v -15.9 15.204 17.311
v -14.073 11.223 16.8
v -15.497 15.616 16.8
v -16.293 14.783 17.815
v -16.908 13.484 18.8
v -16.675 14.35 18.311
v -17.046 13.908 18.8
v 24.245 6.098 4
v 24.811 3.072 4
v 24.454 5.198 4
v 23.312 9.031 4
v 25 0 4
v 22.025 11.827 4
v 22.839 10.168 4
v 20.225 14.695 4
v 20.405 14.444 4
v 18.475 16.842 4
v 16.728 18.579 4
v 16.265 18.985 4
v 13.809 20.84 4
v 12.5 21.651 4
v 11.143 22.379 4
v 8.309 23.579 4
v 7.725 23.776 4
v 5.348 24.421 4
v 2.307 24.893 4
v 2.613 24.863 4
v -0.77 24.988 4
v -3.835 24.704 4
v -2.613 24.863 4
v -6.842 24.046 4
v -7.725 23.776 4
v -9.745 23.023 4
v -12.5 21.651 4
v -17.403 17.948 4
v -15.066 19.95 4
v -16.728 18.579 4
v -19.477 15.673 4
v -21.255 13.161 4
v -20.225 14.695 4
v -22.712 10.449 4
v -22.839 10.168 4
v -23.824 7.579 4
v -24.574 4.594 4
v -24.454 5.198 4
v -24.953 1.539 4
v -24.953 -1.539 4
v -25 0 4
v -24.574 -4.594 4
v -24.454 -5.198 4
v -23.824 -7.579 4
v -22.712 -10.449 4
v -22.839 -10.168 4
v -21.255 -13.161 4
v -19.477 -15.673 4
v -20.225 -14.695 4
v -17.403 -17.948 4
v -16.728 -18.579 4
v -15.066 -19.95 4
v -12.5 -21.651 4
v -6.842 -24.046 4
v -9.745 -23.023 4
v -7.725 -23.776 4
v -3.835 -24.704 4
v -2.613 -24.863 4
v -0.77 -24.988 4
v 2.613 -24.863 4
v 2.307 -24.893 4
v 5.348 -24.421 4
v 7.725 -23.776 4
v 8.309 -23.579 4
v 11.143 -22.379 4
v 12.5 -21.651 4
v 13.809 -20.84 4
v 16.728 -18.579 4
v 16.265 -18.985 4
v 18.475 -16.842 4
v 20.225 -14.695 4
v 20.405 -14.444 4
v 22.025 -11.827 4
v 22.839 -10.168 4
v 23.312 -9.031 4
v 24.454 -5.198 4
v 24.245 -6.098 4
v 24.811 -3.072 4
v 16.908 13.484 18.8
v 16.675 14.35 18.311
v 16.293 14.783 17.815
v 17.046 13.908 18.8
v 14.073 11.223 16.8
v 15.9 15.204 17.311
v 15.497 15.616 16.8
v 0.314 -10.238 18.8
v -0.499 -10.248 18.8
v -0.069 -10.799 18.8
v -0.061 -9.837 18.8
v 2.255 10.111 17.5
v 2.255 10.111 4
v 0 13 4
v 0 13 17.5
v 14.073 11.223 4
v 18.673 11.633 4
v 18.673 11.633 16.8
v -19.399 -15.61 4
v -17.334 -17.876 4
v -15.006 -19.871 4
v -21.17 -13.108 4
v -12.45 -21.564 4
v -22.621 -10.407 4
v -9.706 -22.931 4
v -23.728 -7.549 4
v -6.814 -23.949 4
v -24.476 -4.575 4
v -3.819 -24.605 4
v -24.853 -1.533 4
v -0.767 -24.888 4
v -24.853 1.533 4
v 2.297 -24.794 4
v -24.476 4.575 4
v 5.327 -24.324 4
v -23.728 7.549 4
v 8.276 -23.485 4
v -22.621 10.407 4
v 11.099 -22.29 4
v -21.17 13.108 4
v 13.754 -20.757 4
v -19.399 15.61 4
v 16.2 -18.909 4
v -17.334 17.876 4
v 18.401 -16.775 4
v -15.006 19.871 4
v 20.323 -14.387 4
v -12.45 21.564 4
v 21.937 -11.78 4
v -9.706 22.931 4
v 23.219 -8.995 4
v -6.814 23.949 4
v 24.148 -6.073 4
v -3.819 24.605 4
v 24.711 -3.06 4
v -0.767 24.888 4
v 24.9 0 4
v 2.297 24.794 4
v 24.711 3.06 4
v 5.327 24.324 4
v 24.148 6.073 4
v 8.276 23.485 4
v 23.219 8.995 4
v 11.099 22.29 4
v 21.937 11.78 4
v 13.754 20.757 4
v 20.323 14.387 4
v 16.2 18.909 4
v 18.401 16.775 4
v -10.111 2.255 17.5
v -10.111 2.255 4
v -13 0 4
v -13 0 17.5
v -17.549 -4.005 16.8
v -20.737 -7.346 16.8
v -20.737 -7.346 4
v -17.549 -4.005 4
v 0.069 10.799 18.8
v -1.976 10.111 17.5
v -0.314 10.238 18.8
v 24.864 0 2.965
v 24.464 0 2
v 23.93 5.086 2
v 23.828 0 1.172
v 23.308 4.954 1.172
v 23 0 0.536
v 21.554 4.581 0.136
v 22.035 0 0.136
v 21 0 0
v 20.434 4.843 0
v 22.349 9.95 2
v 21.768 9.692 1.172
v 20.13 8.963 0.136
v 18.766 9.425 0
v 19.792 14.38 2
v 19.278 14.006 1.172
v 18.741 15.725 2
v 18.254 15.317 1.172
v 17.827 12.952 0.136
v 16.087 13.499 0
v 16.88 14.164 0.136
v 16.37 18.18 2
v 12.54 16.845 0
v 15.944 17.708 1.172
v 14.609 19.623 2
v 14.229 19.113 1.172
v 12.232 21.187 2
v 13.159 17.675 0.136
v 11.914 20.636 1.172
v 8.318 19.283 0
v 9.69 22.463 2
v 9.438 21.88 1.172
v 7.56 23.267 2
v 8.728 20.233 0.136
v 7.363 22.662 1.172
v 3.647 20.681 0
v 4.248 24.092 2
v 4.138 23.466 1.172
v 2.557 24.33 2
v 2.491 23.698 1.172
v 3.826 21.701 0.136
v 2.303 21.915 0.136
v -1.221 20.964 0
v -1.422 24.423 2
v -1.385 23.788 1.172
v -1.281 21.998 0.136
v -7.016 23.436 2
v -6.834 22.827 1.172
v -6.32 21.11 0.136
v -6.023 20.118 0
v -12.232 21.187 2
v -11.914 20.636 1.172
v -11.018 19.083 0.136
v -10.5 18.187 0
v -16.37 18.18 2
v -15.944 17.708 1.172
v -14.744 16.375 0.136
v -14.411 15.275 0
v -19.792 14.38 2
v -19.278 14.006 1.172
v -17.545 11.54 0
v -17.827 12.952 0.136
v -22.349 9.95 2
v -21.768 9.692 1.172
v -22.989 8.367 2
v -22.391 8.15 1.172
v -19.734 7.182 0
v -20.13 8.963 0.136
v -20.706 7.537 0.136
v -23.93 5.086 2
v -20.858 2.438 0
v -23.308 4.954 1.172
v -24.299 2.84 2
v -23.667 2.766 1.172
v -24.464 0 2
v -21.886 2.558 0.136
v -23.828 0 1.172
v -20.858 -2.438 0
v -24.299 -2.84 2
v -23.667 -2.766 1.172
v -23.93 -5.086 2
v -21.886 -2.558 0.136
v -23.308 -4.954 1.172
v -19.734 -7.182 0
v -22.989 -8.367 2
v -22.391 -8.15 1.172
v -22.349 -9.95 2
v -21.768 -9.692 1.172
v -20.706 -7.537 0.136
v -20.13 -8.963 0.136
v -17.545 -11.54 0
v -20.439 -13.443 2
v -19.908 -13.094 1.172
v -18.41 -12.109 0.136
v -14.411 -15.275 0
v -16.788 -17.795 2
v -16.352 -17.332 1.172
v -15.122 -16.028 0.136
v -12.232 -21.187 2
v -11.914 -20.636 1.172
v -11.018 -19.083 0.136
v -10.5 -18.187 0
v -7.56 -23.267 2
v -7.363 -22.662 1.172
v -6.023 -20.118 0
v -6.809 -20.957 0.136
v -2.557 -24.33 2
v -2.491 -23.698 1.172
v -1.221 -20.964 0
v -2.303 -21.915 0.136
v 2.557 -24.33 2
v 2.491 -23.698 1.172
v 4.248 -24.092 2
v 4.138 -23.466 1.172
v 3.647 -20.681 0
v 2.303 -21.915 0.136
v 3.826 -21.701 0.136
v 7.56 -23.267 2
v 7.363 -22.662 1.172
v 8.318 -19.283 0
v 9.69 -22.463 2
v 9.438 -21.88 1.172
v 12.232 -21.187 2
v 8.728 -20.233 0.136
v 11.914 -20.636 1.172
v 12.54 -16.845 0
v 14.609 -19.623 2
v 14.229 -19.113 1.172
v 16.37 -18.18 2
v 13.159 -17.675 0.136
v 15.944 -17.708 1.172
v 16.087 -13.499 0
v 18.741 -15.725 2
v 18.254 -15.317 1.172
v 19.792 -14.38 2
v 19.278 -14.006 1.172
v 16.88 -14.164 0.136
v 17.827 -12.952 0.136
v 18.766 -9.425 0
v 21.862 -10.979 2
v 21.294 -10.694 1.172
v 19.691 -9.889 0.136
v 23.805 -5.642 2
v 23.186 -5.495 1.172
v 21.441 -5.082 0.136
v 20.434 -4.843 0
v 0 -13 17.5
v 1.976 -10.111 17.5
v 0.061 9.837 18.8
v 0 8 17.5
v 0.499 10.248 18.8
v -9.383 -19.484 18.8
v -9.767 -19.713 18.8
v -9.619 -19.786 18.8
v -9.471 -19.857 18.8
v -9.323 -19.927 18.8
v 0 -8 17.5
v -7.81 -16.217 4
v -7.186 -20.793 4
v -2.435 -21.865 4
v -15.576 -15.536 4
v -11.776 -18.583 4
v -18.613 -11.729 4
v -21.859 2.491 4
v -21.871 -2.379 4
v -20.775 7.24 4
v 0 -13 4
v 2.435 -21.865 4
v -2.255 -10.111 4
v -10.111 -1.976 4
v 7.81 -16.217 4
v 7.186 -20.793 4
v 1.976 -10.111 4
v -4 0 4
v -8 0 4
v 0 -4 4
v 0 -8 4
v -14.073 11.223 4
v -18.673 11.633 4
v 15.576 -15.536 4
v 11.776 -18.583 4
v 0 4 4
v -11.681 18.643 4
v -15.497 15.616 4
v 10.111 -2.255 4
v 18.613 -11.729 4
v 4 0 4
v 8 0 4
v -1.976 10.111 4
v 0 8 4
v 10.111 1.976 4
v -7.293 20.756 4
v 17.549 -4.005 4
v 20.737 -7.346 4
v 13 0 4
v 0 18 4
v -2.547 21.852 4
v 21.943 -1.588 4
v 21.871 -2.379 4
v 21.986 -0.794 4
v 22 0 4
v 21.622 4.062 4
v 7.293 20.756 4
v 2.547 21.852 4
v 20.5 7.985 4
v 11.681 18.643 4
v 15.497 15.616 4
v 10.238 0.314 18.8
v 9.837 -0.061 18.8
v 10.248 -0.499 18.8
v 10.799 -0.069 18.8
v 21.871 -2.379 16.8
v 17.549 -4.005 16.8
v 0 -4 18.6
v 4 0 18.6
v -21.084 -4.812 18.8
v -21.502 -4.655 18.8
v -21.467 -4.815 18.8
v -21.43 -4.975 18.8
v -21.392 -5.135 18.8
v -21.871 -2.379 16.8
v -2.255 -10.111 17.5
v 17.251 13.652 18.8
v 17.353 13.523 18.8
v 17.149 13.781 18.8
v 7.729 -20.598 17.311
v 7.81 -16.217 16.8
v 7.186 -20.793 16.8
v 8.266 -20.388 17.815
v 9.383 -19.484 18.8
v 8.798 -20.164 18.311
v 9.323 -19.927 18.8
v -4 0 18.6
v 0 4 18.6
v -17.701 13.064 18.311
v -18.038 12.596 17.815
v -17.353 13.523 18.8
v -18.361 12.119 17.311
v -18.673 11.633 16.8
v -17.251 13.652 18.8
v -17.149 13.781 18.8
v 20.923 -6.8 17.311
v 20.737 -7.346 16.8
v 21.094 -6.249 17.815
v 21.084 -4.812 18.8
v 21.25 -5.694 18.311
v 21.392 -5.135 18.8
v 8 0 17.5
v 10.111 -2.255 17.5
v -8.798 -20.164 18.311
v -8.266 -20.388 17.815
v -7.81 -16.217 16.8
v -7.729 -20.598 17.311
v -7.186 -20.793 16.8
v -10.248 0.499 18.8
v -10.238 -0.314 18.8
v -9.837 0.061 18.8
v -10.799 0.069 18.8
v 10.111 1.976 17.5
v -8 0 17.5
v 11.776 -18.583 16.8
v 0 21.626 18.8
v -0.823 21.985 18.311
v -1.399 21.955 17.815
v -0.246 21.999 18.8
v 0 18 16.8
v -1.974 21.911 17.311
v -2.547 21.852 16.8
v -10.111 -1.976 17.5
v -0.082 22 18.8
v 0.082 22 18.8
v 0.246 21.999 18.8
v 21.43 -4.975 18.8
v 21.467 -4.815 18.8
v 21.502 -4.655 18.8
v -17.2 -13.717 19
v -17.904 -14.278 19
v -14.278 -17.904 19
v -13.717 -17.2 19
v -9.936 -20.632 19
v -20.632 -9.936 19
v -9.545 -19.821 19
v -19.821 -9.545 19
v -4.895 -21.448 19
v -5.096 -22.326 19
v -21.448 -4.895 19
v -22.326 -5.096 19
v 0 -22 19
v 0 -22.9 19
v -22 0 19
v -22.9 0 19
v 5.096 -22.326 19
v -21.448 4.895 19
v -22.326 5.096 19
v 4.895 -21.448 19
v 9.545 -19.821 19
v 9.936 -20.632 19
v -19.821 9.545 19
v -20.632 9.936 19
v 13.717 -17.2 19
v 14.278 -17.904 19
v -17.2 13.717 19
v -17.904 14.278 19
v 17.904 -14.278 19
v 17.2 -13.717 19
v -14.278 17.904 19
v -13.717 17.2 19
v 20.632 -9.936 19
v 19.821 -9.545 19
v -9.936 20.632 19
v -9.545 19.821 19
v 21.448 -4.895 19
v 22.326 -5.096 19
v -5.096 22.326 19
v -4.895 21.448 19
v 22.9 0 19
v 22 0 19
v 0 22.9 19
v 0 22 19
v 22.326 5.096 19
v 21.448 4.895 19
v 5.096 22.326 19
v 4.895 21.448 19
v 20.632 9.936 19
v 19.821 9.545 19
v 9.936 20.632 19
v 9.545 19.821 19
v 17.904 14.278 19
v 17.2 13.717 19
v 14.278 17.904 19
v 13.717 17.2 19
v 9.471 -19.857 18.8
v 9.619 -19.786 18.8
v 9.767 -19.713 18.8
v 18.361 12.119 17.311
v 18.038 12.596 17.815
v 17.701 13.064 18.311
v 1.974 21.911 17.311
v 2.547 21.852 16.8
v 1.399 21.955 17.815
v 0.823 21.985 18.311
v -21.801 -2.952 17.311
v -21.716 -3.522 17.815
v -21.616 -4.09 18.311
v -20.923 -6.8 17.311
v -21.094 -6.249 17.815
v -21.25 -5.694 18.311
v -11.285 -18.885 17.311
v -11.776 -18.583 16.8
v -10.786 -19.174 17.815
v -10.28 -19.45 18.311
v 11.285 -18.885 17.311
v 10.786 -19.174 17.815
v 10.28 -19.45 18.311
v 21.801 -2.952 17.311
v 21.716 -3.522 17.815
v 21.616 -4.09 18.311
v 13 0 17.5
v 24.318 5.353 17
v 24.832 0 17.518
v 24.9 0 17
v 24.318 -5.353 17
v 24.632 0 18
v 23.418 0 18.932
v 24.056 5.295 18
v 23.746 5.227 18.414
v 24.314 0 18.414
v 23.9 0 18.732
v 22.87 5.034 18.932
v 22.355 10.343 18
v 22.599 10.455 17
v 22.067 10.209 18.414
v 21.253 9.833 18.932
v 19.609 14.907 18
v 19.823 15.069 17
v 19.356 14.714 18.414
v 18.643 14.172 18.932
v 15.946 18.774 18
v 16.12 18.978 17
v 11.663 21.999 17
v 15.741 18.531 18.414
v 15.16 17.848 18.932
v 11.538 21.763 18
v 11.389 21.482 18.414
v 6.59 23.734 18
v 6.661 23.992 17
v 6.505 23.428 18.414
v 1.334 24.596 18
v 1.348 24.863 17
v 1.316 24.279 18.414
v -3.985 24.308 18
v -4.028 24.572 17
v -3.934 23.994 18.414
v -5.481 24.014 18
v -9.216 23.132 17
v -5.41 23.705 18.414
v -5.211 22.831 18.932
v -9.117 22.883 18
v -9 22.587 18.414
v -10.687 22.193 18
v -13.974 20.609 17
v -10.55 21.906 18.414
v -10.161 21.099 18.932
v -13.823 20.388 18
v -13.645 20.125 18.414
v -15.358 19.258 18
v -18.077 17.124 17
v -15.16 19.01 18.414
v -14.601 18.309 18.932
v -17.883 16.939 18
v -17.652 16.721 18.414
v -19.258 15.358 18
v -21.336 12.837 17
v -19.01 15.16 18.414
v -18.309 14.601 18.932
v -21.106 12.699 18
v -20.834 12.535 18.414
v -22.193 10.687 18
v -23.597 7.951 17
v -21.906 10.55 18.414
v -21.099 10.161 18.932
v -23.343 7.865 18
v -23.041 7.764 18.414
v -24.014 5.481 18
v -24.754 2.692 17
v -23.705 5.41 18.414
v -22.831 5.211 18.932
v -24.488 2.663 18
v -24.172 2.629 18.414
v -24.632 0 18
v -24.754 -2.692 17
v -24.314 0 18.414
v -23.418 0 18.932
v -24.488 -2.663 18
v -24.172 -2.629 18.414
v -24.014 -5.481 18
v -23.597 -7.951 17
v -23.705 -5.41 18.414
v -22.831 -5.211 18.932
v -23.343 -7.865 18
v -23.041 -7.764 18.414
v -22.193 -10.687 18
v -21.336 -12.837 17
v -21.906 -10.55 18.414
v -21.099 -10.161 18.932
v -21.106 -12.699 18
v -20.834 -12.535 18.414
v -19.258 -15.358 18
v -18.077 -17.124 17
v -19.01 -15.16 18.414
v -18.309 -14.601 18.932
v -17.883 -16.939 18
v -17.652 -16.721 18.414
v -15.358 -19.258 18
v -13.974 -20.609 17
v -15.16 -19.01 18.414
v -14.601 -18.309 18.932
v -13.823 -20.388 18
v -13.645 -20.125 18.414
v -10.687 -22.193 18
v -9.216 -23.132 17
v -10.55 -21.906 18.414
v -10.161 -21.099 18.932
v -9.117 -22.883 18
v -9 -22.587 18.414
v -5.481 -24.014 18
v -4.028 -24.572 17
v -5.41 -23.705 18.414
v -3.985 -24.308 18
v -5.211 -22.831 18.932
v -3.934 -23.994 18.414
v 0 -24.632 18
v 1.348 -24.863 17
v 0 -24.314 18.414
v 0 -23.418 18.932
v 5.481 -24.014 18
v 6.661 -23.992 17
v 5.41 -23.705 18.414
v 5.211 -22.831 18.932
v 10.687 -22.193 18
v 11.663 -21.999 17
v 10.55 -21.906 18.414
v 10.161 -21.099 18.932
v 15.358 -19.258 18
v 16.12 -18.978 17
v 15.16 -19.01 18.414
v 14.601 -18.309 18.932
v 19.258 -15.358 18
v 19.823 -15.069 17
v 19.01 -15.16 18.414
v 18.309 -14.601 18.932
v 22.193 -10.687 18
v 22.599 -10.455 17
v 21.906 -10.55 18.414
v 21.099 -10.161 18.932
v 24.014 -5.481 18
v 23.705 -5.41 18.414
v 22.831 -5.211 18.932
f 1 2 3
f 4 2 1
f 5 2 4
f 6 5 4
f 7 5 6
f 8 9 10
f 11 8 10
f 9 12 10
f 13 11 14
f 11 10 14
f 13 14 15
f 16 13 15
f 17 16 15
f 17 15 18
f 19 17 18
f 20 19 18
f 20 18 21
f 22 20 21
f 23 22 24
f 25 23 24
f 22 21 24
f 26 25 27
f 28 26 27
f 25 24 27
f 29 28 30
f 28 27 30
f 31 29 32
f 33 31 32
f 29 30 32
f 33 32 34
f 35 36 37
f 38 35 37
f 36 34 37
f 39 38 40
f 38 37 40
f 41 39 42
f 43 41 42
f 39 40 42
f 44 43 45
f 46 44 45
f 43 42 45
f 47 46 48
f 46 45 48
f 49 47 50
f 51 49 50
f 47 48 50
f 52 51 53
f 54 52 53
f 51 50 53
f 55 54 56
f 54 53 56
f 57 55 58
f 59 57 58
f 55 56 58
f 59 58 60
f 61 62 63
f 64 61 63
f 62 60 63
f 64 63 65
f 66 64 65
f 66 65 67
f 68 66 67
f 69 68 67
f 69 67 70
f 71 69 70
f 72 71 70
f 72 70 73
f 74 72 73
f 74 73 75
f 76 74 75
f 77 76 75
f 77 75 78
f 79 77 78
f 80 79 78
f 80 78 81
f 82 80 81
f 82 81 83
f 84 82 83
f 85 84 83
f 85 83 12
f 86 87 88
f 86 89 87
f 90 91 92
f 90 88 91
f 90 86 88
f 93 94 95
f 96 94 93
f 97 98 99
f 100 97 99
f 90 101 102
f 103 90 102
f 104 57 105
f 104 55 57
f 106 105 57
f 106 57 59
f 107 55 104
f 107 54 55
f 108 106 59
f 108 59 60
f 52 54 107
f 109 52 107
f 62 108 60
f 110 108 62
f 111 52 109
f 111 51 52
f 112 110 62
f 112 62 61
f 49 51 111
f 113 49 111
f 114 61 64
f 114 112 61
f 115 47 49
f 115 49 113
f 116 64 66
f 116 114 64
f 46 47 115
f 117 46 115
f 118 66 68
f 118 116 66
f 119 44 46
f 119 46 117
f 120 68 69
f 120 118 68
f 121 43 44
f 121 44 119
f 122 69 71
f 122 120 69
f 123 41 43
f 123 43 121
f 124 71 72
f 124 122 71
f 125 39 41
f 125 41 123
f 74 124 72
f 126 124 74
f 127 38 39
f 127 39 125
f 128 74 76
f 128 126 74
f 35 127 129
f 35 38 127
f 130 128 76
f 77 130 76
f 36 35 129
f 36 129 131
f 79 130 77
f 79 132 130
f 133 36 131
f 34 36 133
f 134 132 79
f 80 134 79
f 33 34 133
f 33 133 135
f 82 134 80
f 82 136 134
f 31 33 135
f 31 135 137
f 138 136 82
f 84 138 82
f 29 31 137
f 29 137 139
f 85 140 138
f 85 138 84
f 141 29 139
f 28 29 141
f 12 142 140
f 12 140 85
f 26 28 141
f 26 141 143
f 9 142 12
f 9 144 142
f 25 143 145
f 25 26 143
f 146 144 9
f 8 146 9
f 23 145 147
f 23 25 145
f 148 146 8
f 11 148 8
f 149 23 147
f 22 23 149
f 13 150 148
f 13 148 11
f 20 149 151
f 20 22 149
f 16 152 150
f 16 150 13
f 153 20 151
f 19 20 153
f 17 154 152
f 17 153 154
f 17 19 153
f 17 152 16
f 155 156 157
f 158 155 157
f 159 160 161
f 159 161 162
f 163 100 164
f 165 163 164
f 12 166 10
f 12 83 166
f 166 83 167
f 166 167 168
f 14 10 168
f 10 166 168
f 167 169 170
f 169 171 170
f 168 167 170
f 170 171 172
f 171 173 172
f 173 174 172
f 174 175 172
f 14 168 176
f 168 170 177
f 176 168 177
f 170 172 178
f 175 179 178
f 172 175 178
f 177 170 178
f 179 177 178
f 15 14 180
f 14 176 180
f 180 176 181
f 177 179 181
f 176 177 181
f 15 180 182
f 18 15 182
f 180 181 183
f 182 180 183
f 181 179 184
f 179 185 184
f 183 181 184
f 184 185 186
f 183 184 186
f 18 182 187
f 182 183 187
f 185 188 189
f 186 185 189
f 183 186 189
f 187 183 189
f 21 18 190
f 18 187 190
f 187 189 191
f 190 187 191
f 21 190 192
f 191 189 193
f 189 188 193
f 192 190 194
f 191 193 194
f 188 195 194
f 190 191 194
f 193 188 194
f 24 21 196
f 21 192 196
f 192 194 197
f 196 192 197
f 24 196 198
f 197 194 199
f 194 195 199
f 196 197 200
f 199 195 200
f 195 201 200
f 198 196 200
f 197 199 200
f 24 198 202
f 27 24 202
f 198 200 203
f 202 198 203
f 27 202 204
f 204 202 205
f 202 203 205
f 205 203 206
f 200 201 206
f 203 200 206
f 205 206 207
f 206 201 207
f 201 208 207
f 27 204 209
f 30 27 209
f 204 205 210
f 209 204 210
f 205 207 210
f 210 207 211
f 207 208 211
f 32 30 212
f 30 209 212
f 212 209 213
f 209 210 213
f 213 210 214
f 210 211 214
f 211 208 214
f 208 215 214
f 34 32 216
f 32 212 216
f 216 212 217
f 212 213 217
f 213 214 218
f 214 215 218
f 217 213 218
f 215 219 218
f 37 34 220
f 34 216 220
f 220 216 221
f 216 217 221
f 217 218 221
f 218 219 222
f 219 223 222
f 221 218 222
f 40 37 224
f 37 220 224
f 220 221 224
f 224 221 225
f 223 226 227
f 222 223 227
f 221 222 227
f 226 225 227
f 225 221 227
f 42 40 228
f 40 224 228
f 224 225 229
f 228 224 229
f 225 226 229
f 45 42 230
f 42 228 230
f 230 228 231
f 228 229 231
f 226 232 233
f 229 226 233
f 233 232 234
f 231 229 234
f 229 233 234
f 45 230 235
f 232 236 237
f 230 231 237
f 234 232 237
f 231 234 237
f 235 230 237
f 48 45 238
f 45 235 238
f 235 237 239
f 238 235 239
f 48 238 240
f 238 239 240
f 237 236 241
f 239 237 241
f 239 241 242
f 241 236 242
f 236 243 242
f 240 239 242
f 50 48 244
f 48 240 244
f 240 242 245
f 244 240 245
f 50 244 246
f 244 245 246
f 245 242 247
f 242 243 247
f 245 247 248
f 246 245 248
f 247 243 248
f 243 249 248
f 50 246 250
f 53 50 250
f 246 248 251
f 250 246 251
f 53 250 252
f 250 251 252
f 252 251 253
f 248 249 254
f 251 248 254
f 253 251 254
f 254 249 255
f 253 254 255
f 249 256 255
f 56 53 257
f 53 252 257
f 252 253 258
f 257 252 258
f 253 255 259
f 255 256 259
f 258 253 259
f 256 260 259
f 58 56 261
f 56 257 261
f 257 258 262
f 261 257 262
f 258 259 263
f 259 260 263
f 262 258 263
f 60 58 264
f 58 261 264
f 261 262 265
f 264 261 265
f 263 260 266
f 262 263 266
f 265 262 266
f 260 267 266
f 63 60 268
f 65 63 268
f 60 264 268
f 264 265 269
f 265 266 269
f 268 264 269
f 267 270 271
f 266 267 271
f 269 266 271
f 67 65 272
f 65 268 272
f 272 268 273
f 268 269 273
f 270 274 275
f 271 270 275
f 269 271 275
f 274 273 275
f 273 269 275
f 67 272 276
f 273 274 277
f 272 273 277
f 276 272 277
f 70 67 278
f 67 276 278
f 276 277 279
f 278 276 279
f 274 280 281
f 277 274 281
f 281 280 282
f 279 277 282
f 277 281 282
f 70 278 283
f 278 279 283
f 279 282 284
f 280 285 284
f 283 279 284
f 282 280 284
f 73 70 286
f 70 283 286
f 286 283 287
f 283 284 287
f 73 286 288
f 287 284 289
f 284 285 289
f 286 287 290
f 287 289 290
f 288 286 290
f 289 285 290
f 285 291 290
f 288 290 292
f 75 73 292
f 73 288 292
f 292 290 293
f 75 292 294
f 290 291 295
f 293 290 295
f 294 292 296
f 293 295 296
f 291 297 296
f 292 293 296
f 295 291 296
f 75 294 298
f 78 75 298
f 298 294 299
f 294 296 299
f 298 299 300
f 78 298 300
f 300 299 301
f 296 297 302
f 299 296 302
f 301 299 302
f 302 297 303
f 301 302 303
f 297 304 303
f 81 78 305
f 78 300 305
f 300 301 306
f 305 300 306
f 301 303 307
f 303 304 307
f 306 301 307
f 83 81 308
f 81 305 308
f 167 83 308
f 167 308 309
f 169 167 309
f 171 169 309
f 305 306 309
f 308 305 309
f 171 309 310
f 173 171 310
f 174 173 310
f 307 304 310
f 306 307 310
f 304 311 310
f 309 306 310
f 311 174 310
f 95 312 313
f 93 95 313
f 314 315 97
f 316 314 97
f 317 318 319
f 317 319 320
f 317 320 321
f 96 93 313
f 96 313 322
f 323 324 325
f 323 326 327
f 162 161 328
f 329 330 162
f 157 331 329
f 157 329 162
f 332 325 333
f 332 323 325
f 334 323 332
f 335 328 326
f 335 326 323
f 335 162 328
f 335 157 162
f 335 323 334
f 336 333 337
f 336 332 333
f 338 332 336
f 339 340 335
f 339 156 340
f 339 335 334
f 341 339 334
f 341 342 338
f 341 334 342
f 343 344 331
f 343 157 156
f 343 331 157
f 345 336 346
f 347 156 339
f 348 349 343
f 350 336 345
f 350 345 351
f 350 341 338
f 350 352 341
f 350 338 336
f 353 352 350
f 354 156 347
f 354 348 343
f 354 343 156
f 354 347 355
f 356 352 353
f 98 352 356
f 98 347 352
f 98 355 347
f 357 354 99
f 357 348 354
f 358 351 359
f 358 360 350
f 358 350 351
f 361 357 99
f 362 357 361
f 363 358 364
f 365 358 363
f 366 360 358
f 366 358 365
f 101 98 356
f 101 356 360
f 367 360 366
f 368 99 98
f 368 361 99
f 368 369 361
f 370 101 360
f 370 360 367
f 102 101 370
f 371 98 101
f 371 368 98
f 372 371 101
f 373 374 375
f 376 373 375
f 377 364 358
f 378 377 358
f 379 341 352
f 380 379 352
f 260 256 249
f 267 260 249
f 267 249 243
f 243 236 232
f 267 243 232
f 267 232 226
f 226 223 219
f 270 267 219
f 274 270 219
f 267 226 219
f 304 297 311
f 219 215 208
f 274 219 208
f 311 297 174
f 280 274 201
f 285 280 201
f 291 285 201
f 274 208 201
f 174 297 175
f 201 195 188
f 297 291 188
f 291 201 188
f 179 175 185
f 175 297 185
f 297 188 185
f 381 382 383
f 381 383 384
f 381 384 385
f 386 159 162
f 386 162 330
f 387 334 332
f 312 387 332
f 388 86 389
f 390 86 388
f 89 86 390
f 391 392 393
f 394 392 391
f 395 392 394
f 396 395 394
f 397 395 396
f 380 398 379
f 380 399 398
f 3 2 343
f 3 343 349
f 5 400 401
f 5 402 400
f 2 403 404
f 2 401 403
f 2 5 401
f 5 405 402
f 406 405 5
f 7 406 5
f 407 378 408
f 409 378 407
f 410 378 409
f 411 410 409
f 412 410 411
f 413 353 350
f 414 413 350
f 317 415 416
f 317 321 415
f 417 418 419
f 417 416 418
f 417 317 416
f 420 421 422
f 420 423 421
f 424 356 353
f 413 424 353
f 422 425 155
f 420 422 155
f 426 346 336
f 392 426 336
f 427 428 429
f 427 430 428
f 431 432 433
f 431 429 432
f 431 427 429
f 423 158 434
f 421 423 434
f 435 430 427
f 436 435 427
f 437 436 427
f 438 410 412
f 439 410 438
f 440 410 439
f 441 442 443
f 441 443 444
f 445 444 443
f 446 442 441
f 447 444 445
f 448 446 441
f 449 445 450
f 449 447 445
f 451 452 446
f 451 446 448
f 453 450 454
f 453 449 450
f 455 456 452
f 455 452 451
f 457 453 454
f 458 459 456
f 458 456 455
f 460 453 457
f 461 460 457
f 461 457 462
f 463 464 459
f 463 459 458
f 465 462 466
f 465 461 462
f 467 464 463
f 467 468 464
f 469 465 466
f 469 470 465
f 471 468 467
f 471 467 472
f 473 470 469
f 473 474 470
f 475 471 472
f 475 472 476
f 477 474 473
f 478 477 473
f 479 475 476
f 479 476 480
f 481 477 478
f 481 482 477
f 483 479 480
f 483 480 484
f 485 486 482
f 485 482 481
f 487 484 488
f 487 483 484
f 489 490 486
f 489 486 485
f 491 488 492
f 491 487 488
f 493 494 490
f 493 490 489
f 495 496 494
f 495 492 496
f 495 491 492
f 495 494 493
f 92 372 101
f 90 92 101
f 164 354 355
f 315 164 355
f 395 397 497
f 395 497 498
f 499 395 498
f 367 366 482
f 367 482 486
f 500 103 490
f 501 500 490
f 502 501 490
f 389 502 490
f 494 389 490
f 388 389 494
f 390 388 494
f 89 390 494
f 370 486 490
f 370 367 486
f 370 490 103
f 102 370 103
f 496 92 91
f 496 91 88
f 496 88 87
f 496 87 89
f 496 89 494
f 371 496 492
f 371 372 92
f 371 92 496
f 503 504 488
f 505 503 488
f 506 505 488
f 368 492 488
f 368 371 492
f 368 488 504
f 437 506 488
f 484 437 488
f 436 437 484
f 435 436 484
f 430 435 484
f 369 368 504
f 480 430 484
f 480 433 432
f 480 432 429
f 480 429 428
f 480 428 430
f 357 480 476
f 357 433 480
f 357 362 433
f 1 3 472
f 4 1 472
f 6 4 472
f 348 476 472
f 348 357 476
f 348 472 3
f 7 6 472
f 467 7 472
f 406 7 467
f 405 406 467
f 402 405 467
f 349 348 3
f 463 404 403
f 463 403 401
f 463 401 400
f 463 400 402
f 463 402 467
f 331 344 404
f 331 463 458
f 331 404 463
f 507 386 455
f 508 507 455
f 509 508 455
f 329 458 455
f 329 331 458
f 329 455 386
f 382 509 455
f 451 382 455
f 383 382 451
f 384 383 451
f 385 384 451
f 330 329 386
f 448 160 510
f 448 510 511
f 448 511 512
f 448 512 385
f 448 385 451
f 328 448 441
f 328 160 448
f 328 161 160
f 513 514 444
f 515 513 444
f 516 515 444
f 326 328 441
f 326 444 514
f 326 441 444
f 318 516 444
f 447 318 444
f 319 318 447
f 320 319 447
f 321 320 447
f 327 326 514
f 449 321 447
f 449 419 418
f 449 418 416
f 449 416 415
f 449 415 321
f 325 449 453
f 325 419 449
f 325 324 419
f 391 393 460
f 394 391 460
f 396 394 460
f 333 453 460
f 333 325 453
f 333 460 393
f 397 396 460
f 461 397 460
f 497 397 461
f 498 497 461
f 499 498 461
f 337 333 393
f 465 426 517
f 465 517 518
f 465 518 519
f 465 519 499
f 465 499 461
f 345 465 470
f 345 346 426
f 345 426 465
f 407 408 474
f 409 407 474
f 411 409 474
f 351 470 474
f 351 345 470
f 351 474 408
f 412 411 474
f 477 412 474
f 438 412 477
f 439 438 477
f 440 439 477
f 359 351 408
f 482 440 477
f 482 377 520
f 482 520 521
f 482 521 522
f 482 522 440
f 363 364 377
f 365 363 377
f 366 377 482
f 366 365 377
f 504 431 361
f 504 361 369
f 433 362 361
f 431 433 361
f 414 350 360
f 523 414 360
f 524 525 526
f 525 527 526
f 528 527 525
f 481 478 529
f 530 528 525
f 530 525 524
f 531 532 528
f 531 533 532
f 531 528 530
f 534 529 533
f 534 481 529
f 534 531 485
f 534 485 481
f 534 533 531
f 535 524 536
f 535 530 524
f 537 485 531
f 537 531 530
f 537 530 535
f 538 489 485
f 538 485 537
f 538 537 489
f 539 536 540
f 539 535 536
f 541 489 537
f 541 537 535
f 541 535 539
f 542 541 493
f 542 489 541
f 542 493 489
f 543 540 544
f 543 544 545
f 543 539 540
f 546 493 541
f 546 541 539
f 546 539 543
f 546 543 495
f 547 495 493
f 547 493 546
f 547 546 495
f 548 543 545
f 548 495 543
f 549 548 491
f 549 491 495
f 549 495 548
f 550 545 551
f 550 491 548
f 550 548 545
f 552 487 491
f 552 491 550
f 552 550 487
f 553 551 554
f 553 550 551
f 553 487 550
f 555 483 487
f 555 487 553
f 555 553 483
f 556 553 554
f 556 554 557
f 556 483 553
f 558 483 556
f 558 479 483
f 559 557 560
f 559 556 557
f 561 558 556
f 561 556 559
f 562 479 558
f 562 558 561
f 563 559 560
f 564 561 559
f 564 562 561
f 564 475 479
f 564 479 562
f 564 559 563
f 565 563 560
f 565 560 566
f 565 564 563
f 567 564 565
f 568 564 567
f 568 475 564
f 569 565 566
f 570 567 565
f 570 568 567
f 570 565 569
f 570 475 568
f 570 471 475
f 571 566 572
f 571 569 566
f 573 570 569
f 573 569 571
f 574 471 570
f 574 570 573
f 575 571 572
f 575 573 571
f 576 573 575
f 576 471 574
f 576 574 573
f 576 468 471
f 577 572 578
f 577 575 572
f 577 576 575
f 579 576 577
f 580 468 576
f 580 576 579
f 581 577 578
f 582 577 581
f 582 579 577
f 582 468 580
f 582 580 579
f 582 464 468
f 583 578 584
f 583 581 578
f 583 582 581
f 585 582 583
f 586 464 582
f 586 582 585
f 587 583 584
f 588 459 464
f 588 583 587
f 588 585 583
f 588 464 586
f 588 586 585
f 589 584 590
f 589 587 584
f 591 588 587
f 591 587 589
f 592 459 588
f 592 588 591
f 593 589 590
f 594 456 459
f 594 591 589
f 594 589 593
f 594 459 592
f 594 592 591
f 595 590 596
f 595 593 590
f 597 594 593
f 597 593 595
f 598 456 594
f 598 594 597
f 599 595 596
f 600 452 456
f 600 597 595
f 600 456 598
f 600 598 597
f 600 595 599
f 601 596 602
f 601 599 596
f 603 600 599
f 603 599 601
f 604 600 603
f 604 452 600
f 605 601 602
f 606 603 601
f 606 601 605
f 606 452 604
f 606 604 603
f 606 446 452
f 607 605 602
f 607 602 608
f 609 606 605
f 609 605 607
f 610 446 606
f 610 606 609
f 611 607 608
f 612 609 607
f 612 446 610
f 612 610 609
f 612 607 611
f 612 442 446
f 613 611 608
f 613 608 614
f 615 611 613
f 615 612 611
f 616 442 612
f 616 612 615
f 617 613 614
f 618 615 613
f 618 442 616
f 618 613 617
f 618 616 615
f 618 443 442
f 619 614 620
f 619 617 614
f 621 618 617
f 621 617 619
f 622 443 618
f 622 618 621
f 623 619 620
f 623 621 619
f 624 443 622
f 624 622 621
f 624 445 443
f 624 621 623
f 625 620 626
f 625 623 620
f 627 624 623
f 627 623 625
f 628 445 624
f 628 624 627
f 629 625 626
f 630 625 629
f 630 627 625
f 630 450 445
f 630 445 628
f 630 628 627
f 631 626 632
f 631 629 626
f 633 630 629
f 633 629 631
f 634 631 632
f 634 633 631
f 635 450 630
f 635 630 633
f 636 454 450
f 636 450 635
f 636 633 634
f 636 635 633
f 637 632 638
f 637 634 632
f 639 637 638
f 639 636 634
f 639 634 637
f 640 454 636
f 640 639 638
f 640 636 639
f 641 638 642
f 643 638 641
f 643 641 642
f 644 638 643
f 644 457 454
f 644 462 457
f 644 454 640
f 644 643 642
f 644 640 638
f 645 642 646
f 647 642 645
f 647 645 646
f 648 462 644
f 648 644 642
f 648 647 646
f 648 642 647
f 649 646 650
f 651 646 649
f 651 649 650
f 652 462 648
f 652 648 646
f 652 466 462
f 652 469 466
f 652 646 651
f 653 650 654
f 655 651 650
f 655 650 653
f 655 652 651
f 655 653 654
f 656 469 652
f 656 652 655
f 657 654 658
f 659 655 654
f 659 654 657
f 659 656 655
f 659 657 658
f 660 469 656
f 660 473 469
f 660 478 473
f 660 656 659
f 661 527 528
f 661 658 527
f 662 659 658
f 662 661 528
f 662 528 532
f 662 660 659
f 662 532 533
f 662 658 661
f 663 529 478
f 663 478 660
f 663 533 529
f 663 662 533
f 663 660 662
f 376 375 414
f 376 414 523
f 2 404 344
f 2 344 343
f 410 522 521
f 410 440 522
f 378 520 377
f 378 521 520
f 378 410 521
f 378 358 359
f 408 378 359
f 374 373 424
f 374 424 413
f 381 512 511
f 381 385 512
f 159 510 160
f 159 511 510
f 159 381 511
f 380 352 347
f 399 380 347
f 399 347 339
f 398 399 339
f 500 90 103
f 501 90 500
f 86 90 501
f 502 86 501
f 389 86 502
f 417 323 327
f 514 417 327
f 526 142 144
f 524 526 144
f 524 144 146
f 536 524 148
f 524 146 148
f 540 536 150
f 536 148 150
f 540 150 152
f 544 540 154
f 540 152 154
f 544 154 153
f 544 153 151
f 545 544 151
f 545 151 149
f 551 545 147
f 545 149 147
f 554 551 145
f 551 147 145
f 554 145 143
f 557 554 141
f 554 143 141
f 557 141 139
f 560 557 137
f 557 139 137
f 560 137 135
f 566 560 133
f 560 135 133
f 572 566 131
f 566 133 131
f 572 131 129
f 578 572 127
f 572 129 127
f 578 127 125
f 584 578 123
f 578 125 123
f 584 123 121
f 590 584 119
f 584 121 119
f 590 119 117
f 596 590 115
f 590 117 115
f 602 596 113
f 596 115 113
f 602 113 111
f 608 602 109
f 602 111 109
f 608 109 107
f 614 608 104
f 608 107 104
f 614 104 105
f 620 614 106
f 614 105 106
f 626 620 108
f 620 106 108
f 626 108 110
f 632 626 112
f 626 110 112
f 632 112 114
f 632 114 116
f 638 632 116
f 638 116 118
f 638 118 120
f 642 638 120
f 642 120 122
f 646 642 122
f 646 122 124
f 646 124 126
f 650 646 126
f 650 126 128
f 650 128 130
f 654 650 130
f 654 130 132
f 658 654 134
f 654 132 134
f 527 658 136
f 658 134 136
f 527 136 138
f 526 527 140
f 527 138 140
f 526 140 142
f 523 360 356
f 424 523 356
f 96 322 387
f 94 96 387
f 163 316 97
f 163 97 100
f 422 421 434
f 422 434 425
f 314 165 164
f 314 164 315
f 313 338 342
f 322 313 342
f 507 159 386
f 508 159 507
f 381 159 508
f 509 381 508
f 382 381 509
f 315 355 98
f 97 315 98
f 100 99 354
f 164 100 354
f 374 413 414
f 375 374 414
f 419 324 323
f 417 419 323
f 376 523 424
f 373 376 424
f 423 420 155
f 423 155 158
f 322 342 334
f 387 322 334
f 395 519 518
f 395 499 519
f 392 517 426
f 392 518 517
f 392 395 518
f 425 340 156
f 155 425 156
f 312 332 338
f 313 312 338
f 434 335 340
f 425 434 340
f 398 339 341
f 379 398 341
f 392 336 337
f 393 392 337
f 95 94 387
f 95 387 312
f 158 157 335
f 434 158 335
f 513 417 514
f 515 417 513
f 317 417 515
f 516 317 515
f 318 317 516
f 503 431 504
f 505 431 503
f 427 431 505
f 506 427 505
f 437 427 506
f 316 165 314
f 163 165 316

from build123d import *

# Parameters (mm, degrees)
F0_R      = 25
F1_DEPTH  = 4
F3_DEPTH  = 14.8
F4_R      = 24.9
F4_R_2    = 22
F5_DEPTH  = 15
F6_SIZE   = 1.3
F7_SIZE   = 2
F8_R      = 3.99999
F9_R      = 2
F10_R     = 4.5599564507
F11_DEPTH = 0.2


# Not quite as in the source:
# - a fillet or chamfer is up to 0.001 mm smaller than in the source, because OpenCascade refuses the exact size
# - a feature names something its author has since deleted; it is built from what else it names


with BuildPart() as f1:
    # F0 (on Top) → F1 (new body)
    with BuildSketch(Plane.XY):
        Circle(F0_R)
    extrude(amount=F1_DEPTH)

    # F2 (on face) → F3 (join)
    with BuildSketch(Plane.XY.offset(4)):
        Polygon((1.9764285987, -10.1112626395), (0, -8), (-2.2552952007, -10.1112626395), (0, -13), align=None)
        Polygon((0, -4), (4, 0), (0, 4), (-4, 0), align=None)
        Polygon((-10.1112626395, -1.9764285987), (-8, 0), (-10.1112626395, 2.2552952007), (-13, 0), align=None)
        Polygon((-1.9764285987, 10.1112626395), (0, 8), (2.2552952007, 10.1112626395), (0, 13), align=None)
        Polygon((10.1112626395, 1.9764285987), (8, 0), (10.1112626395, -2.2552952007), (13, 0), align=None)
        with BuildLine():
            Line((14.0729666844, 11.2228164335), (18.6727000521, 11.6331540333))
            ThreePointArc((18.6727000521, 11.6331540333), (17.2002926143, 13.7167756409), (15.4965532289, 15.6159161763))
            Line((15.4965532289, 15.6159161763), (14.0729666844, 11.2228164335))
        make_face()
        with BuildLine():
            ThreePointArc((20.7374041193, -7.3457518602), (21.448414068, -4.895460547), (21.8709577964, -2.3793287015))
            Line((21.8709577964, -2.3793287015), (17.5487024193, -4.0053768112))
            Line((17.5487024193, -4.0053768112), (20.7374041193, -7.3457518602))
        make_face()
        with BuildLine():
            ThreePointArc((7.1864199187, -20.793156777), (9.5454422606, -19.8213150939), (11.776085057, -18.5828905376))
            Line((11.776085057, -18.5828905376), (7.8099073041, -16.2174396222))
            Line((7.8099073041, -16.2174396222), (7.1864199187, -20.793156777))
        make_face()
        with BuildLine():
            Line((-7.1864199187, -20.793156777), (-7.8099073041, -16.2174396222))
            Line((-7.8099073041, -16.2174396222), (-11.776085057, -18.5828905376))
            ThreePointArc((-11.776085057, -18.5828905376), (-9.5454422606, -19.8213150939), (-7.1864199187, -20.793156777))
        make_face()
        with BuildLine():
            Line((-20.7374041193, -7.3457518602), (-17.5487024193, -4.0053768112))
            Line((-17.5487024193, -4.0053768112), (-21.8709577964, -2.3793287015))
            ThreePointArc((-21.8709577964, -2.3793287015), (-21.448414068, -4.895460547), (-20.7374041193, -7.3457518602))
        make_face()
        with BuildLine():
            Line((-18.6727000521, 11.6331540333), (-14.0729666844, 11.2228164335))
            Line((-14.0729666844, 11.2228164335), (-15.4965532289, 15.6159161763))
            ThreePointArc((-15.4965532289, 15.6159161763), (-17.2002926143, 13.7167756409), (-18.6727000521, 11.6331540333))
        make_face()
        with BuildLine():
            Line((0, 18), (2.547071992, 21.8520576667))
            ThreePointArc((2.547071992, 21.8520576667), (0, 22), (-2.547071992, 21.8520576667))
            Line((-2.547071992, 21.8520576667), (0, 18))
        make_face()
    extrude(amount=F3_DEPTH)

    # F4 (on face) → F5 (join)
    with BuildSketch(Plane.XY.offset(4)):
        Circle(F4_R)
        Circle(F4_R_2, mode=Mode.SUBTRACT)
    extrude(amount=F5_DEPTH)

    # F6
    f6_edges = [f1.edges().sort_by_distance(p)[0] for p in [
        (-9.055631, -0.988214, 18.8),
        (-9.055631, 1.127648, 18.8),
        (-11.555631, 1.127648, 18.8),
        (-11.555631, -0.988214, 18.8),
        (0.988214, -9.055631, 18.8),
        (-1.127648, -9.055631, 18.8),
        (-1.127648, -11.555631, 18.8),
        (0.988214, -11.555631, 18.8),
        (9.055631, 0.988214, 18.8),
        (9.055631, -1.127648, 18.8),
        (11.555631, -1.127648, 18.8),
        (11.555631, 0.988214, 18.8),
        (-0.988214, 9.055631, 18.8),
        (1.127648, 9.055631, 18.8),
        (1.127648, 11.555631, 18.8),
        (-0.988214, 11.555631, 18.8),
    ]]
    chamfer(f6_edges, length=F6_SIZE)

    # F7
    f7_edges = [f1.edges().sort_by_distance(p)[0] for p in [
        (14.78476, 13.419366, 18.8),
        (16.372833, 11.427985, 18.8),
        (19.70983, -3.192353, 18.8),
        (19.143053, -5.675564, 18.8),
        (9.792996, -17.400165, 18.8),
        (7.498164, -18.505298, 18.8),
        (-9.792996, -17.400165, 18.8),
        (-7.498164, -18.505298, 18.8),
        (-19.143053, -5.675564, 18.8),
        (-19.70983, -3.192353, 18.8),
        (-16.372833, 11.427985, 18.8),
        (-1.273536, 19.926029, 18.8),
        (1.273536, 19.926029, 18.8),
        (-14.78476, 13.419366, 18.8),
    ]]
    chamfer(f7_edges, length=F7_SIZE)

    # F8 (radius 4 in the source; OpenCascade refuses exactly that, so slightly less here)
    f8_edges = [f1.edges().sort_by_distance(p)[0] for p in [
        (-25, 0, 0),
    ]]
    fillet(f8_edges, radius=F8_R)

    # F9
    f9_edges = [f1.edges().sort_by_distance(p)[0] for p in [
        (-24.9, 0, 19),
    ]]
    fillet(f9_edges, radius=F9_R)

    # F10 (on face) → F11 (cut)
    with BuildSketch(Plane.XY.offset(18.8)):
        Circle(F10_R)
    extrude(amount=-F11_DEPTH, mode=Mode.SUBTRACT)


solid = f1.part
